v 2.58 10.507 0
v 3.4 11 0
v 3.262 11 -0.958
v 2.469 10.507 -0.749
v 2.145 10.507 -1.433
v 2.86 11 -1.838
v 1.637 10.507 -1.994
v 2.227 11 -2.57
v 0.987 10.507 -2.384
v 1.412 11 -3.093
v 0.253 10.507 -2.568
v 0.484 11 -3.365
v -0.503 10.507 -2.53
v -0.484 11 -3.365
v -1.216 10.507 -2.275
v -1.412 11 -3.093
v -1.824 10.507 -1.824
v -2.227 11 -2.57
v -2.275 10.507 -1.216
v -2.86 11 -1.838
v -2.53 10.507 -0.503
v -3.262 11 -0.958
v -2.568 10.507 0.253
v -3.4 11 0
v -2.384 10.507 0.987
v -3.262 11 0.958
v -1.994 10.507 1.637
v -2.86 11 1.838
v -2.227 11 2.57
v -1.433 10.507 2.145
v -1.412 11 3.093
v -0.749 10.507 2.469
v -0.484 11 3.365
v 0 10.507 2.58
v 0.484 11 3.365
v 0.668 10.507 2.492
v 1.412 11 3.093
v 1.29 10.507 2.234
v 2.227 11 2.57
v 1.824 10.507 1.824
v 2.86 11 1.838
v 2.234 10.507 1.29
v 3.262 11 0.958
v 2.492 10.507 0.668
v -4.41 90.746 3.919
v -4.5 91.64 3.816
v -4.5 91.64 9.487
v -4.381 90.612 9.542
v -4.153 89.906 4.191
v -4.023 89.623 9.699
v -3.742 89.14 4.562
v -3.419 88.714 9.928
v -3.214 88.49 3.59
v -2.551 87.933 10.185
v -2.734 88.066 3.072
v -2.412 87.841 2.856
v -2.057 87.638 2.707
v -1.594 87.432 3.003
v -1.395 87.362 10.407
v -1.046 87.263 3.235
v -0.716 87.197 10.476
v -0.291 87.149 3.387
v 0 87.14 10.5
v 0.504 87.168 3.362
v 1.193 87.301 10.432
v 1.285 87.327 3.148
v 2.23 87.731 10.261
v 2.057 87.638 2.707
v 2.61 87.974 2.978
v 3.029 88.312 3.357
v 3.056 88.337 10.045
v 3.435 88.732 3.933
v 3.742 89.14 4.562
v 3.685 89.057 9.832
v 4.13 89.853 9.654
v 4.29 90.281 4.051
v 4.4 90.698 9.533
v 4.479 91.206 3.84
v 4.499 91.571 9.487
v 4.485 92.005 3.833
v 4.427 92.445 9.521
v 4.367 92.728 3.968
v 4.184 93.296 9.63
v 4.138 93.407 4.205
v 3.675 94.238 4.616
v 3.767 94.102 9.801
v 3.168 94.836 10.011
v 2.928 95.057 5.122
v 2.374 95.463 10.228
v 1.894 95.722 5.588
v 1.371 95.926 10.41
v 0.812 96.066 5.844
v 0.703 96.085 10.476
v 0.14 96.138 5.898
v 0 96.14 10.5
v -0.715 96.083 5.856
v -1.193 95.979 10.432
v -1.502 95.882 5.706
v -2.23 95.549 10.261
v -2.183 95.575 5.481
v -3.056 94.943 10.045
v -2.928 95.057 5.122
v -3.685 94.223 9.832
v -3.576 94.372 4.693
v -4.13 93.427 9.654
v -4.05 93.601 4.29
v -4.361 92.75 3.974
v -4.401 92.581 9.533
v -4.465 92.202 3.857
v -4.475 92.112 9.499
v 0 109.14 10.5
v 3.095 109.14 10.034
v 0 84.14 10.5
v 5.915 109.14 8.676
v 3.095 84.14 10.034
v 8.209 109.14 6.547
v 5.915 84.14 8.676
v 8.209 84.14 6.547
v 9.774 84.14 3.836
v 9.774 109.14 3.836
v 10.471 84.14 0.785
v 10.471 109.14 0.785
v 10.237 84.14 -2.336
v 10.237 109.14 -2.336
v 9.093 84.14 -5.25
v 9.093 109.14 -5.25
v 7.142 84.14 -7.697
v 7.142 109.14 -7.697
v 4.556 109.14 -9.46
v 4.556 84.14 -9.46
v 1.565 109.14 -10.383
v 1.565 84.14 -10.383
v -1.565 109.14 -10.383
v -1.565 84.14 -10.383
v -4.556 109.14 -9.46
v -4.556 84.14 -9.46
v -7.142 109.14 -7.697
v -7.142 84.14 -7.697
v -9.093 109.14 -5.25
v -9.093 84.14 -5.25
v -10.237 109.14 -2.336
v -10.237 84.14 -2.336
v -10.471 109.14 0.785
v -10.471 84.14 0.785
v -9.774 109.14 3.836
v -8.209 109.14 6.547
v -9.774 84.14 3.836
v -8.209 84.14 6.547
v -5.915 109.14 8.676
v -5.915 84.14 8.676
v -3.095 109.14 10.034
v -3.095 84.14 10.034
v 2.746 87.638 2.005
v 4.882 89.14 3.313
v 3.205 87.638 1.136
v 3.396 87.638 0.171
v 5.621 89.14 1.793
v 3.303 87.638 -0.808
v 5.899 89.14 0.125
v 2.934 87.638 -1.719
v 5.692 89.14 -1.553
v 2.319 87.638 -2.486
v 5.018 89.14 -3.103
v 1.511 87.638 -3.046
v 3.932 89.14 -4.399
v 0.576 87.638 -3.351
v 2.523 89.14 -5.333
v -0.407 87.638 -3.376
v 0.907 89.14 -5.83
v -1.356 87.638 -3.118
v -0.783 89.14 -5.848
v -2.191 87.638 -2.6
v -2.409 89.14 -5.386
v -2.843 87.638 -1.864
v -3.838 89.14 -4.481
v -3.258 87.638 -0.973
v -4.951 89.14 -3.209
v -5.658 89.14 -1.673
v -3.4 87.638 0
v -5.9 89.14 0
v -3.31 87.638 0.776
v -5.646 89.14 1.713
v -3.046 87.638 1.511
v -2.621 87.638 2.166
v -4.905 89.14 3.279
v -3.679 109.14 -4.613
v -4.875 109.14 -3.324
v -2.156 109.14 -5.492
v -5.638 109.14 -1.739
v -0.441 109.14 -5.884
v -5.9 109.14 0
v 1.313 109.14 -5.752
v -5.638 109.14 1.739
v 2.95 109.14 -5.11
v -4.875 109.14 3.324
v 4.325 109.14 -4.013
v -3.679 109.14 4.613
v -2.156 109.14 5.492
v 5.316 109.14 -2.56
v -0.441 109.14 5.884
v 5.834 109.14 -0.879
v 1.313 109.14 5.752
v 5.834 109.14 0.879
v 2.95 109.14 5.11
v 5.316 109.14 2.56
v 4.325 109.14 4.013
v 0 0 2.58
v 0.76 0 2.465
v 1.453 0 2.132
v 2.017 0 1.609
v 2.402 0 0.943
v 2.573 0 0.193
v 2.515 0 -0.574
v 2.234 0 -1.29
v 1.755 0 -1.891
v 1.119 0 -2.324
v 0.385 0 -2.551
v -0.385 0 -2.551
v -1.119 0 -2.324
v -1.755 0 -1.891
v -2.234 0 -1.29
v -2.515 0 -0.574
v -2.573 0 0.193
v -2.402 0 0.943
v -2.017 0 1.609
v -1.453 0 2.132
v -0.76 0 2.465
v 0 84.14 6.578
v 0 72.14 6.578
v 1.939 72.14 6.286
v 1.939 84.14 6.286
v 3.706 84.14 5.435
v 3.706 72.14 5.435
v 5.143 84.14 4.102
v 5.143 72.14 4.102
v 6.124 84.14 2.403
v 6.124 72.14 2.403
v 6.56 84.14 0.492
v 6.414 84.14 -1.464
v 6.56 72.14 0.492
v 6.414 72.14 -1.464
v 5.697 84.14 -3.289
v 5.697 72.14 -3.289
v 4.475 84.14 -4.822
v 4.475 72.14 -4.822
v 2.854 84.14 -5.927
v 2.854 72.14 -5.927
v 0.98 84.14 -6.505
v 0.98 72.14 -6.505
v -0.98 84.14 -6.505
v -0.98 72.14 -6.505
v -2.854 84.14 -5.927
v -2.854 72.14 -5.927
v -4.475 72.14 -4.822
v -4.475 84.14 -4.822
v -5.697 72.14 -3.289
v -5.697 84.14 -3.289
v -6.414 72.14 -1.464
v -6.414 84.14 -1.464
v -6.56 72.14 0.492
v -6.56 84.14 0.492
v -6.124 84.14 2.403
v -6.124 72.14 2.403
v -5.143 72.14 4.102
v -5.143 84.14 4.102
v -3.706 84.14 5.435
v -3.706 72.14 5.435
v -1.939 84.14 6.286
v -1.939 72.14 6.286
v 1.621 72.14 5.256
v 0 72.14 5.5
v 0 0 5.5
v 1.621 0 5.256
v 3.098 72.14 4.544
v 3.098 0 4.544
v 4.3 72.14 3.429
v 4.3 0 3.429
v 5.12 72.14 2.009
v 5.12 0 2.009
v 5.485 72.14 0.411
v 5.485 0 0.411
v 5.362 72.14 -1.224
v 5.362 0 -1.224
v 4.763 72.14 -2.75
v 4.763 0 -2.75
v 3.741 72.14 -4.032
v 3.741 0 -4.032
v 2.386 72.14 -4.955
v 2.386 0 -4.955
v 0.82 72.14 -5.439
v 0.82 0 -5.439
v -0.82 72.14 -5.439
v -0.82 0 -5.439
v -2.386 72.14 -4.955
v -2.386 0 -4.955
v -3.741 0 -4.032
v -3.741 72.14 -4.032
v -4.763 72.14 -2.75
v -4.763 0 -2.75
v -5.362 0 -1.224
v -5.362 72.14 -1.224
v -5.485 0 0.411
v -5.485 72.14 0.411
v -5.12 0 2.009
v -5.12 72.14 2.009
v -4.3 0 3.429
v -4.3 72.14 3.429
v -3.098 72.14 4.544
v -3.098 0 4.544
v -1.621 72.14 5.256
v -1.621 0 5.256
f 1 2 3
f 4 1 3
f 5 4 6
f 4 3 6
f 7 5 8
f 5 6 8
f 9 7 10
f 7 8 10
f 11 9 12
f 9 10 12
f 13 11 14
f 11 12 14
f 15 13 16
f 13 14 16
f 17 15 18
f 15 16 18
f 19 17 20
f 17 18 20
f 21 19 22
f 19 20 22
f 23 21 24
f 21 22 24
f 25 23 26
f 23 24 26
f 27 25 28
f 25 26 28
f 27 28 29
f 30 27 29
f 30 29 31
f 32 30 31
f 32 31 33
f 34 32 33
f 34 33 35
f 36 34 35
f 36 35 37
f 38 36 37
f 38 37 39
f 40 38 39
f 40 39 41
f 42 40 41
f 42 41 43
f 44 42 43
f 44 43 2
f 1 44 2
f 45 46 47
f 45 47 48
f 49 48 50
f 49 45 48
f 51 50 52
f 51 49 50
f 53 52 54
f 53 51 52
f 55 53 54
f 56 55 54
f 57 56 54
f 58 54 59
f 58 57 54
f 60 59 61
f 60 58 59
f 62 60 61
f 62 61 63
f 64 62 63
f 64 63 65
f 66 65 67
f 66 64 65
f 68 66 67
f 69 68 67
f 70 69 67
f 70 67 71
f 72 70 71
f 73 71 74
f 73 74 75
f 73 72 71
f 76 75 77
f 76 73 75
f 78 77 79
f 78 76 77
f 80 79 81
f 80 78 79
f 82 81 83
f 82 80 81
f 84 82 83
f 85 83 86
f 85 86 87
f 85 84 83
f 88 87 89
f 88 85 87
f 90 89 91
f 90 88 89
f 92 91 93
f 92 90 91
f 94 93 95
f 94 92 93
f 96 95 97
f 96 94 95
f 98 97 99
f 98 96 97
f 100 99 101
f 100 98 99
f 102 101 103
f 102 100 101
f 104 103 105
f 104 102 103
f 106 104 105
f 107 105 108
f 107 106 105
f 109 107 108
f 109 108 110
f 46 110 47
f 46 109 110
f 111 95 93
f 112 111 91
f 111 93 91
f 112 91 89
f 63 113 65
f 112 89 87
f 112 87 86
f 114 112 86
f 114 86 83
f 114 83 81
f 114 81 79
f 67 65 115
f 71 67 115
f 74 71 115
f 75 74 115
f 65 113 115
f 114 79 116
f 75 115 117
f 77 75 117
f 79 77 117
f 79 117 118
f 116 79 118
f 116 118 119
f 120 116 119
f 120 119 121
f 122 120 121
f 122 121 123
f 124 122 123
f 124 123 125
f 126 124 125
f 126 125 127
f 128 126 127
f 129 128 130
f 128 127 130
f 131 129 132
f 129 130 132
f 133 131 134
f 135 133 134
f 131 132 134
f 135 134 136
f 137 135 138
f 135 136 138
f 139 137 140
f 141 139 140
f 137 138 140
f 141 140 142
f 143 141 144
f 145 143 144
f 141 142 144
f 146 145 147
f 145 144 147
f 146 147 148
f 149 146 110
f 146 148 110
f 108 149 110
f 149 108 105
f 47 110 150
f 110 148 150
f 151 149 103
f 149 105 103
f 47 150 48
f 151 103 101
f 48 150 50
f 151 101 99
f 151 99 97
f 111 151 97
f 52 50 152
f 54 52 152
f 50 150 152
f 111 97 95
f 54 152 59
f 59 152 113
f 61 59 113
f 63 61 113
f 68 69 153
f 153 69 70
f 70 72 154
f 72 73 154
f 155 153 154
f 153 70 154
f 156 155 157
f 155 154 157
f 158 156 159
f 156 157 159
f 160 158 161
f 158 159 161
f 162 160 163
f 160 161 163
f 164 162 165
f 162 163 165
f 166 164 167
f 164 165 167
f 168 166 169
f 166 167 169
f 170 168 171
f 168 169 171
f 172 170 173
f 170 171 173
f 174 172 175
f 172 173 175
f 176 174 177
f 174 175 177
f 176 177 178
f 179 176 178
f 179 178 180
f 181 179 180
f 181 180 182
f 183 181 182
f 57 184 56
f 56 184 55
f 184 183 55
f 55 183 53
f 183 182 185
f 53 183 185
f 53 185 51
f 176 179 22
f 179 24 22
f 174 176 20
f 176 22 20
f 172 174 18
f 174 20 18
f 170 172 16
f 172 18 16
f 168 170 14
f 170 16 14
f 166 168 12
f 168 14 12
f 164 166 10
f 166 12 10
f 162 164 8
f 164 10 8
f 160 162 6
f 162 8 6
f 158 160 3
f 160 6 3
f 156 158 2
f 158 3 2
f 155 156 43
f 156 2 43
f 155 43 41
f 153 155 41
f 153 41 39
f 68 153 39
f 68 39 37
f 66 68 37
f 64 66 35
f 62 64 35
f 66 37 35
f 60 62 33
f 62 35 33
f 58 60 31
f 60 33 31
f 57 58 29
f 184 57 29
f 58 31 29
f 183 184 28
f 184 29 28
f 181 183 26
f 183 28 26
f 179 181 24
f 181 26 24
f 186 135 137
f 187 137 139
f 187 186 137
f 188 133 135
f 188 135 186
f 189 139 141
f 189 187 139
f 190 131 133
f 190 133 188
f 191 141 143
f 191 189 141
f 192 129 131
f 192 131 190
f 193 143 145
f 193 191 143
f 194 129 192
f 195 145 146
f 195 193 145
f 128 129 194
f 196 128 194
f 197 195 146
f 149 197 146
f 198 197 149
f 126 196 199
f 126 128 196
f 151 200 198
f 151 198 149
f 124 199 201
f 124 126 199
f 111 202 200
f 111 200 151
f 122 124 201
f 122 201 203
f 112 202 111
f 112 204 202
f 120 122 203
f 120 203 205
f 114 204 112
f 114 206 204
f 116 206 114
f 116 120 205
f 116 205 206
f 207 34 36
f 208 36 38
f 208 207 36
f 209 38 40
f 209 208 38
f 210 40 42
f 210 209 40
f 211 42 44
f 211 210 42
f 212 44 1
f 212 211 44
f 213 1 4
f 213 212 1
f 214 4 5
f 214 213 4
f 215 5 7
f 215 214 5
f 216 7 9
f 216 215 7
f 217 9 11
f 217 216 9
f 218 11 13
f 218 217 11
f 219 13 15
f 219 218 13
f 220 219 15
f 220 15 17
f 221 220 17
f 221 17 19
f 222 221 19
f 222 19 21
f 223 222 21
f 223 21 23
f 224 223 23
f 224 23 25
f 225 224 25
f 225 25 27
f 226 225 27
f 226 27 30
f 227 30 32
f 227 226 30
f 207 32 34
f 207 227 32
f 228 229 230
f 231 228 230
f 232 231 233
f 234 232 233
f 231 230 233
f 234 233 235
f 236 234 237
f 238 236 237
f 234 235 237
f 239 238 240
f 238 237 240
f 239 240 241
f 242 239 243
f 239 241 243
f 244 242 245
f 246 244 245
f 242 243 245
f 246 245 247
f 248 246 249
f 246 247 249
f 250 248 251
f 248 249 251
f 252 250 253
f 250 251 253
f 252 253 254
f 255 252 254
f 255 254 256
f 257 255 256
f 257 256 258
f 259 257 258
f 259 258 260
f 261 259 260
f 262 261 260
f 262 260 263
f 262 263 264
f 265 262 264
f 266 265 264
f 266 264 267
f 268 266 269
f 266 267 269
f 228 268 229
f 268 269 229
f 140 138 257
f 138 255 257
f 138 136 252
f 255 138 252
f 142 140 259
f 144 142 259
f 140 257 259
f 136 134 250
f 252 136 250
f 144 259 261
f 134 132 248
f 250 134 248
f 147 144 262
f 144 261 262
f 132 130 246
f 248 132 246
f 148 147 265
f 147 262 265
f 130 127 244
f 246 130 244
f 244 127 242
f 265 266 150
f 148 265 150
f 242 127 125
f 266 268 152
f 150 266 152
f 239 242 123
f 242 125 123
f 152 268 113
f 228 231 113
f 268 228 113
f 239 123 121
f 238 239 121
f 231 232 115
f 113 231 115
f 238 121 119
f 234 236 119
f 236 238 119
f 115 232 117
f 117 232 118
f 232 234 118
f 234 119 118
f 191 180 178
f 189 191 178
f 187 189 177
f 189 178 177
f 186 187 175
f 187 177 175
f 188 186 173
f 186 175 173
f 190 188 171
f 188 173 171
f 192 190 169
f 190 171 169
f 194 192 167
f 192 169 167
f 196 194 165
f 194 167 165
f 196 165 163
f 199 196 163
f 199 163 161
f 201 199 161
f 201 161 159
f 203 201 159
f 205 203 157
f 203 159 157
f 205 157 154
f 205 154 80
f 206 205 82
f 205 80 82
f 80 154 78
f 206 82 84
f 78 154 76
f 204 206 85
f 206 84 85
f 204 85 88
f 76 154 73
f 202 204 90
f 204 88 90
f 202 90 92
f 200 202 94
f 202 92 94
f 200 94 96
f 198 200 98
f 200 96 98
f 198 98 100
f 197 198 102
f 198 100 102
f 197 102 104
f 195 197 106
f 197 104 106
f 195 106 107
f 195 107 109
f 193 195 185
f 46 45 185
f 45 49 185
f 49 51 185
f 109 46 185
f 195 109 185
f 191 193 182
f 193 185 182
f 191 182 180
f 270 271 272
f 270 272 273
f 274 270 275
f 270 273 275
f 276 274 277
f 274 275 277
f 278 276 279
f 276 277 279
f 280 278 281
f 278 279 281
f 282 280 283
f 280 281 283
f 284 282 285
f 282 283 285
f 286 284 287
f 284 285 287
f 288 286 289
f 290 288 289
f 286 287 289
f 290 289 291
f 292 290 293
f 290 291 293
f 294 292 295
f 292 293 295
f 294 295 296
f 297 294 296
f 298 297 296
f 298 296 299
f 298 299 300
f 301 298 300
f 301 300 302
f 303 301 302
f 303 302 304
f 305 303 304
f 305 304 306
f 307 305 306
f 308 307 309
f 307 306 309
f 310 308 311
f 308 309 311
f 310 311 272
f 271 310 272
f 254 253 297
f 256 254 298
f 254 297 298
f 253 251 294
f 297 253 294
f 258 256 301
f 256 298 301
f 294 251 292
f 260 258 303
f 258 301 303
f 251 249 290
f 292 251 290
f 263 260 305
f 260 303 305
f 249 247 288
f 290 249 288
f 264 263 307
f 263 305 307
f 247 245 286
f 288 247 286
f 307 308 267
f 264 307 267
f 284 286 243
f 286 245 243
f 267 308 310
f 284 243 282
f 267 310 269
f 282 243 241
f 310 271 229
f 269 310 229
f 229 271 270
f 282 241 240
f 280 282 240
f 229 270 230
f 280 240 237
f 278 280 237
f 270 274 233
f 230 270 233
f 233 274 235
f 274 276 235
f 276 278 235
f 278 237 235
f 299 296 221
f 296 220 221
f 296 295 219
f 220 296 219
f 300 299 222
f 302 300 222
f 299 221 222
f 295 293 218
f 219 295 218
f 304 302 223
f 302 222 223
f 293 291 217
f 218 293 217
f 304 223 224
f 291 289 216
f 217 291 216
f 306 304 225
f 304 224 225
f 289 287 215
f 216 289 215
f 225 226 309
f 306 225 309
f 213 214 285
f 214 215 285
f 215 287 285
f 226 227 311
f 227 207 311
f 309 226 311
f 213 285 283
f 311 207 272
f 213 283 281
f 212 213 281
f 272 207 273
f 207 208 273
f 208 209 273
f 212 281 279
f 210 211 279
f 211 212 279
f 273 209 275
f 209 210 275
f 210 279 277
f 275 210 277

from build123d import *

# Parameters (mm, degrees)
SKETCH1_R               = 5.5
SKETCH1_R_2             = 2.58
BOSS_EXTRUDE1_DEPTH     = 72.14
SKETCH5_R               = 6.5785
BOSS_EXTRUDE2_DEPTH     = 12
SKETCH6_R               = 10.5
BOSS_EXTRUDE3_DEPTH     = 25
G1_4_TAPPED_HOLE2_D     = 11.8
G1_4_TAPPED_HOLE2_DEPTH = 20
G1_4_TAPPED_HOLE2_TIP   = 3.545077652
SKETCH15_R              = 2.5
BOSS_EXTRUDE4_DEPTH     = 18
M8_TAPPED_HOLE1_D       = 6.8
M8_TAPPED_HOLE1_DEPTH   = 79.14
M8_TAPPED_HOLE1_TIP     = 2.042926105
SKETCH18_R              = 4.5
CUT_EXTRUDE1_DEPTH      = 20


with BuildPart() as part:
    # Sketch1 → Boss-Extrude1 (new body)
    with BuildSketch(Plane(origin=(0, 0, 0), x_dir=(1, 0, 0), z_dir=(0, 1, 0))):
        with Locations(Location((0, 0, 0), (0, 0, 270))):
            Circle(SKETCH1_R)
        with Locations(Location((0, 0, 0), (0, 0, 270))):
            Circle(SKETCH1_R_2, mode=Mode.SUBTRACT)
    extrude(amount=BOSS_EXTRUDE1_DEPTH)

    # Sketch5 → Boss-Extrude2 (add)
    with BuildSketch(Plane(origin=(0, 72.14, 0), x_dir=(1, 0, 0), z_dir=(0, 1, 0))):
        with Locations(Location((0, 0, 0), (0, 0, 270))):
            Circle(SKETCH5_R)
    extrude(amount=BOSS_EXTRUDE2_DEPTH)

    # Sketch6 → Boss-Extrude3 (add)
    with BuildSketch(Plane(origin=(0, 84.14, 0), x_dir=(1, 0, 0), z_dir=(0, 1, 0))):
        with Locations(Location((0, 0, 0), (0, 0, 270))):
            Circle(SKETCH6_R)
    extrude(amount=BOSS_EXTRUDE3_DEPTH)

    # G1/4 Tapped Hole2
    with Locations(Plane(origin=(0, 109.14, 0), x_dir=(1, 0, 0), z_dir=(0, 1, 0))):
        with Locations((0, 0)):
            Hole(G1_4_TAPPED_HOLE2_D / 2, depth=G1_4_TAPPED_HOLE2_DEPTH)
            with Locations((0, 0, -(G1_4_TAPPED_HOLE2_DEPTH + G1_4_TAPPED_HOLE2_TIP / 2))):  # 118° drill point
                Cone(0, G1_4_TAPPED_HOLE2_D / 2, G1_4_TAPPED_HOLE2_TIP, mode=Mode.SUBTRACT)

    # Sketch15 → Boss-Extrude4 (add)
    with BuildSketch(Plane(origin=(0, 90.14, 0), x_dir=(-1, 0, 0), z_dir=(0, -1, 0))):
        with Locations(Location((0, 0, 0), (0, 0, 270))):
            Circle(SKETCH15_R)
    extrude(amount=BOSS_EXTRUDE4_DEPTH)

    # M8 Tapped Hole1
    with Locations(Plane(origin=(0, 90.14, 0), x_dir=(1, 0, 0), z_dir=(0, 1, 0))):
        with Locations((0, 0)):
            Hole(M8_TAPPED_HOLE1_D / 2, depth=M8_TAPPED_HOLE1_DEPTH)
            with Locations((0, 0, -(M8_TAPPED_HOLE1_DEPTH + M8_TAPPED_HOLE1_TIP / 2))):  # 118° drill point
                Cone(0, M8_TAPPED_HOLE1_D / 2, M8_TAPPED_HOLE1_TIP, mode=Mode.SUBTRACT)

    # Sketch18 → Cut-Extrude1 (cut)
    with BuildSketch(Plane.XY):
        with Locations(Location((0, 91.64, 0), (0, 0, 180))):
            Circle(SKETCH18_R)
    extrude(amount=CUT_EXTRUDE1_DEPTH, mode=Mode.SUBTRACT)


solid = part.part
